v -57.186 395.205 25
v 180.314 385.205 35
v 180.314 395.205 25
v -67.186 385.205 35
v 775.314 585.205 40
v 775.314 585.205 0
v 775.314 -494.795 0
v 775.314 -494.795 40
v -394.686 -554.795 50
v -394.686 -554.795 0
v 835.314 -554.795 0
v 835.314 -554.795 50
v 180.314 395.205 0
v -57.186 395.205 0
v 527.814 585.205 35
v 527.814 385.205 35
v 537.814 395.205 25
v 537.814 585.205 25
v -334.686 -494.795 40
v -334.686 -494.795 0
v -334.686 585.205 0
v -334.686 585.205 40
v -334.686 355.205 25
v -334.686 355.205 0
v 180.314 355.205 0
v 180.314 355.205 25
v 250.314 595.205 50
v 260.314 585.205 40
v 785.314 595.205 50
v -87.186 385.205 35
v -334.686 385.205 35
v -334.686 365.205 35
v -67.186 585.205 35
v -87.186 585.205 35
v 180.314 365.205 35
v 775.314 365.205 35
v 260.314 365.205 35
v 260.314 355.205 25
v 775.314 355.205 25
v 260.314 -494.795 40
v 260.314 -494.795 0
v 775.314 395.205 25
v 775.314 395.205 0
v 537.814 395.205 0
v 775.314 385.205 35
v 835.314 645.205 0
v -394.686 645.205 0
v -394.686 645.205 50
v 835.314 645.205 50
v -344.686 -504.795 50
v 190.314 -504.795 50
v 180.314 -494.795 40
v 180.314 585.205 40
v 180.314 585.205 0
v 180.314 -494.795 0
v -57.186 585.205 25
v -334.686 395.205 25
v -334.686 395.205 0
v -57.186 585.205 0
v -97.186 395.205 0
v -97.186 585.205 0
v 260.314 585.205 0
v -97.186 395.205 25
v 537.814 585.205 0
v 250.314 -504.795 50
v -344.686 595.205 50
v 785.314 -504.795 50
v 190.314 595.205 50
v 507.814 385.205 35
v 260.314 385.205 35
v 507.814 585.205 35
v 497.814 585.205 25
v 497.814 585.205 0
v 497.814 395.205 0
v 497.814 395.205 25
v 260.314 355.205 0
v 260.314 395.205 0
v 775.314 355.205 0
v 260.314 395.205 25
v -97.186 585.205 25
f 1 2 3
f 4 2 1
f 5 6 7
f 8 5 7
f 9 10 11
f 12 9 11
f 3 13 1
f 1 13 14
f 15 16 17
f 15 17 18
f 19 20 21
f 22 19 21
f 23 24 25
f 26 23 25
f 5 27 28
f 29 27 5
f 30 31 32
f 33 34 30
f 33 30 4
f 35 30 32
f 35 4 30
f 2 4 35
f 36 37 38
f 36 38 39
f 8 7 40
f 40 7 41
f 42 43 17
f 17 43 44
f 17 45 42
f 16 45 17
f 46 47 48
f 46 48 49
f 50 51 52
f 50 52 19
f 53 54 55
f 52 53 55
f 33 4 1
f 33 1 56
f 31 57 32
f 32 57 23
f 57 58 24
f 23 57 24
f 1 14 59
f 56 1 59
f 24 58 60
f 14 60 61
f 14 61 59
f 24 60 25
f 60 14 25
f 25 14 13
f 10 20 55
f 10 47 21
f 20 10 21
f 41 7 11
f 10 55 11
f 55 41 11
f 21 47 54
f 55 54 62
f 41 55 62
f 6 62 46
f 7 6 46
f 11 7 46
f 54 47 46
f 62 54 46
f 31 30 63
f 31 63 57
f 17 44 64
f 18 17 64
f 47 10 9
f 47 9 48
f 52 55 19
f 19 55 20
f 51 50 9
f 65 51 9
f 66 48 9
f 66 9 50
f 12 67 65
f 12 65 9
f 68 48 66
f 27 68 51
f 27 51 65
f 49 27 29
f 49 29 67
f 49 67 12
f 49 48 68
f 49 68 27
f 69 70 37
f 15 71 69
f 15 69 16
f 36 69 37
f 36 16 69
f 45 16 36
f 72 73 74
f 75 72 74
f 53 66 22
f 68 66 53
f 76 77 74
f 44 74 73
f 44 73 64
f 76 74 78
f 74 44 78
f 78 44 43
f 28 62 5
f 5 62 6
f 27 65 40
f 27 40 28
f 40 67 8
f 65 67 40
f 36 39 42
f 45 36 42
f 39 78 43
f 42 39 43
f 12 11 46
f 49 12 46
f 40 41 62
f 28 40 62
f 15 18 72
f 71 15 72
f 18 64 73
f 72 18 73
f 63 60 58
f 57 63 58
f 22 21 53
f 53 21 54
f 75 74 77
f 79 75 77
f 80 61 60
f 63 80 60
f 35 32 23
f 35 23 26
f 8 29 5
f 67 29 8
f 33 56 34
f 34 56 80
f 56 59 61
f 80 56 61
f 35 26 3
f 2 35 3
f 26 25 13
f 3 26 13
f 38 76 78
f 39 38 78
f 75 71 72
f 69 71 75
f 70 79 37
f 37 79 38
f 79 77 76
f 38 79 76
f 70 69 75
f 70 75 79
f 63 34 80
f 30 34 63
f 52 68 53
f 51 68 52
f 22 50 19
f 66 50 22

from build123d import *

# Parameters (mm, degrees)
F0_W      = 1230
F0_H      = 1200
F1_DEPTH  = 50
F2_DEPTH  = 35
F3_SIZE   = 10
F3_2_SIZE = 10
F3_3_SIZE = 10


with BuildPart() as f1:
    # F0 (on Top) → F1 (new body)
    with BuildSketch(Plane.XY):
        with Locations((220.3141621128, 45.2047318473)):
            Rectangle(F0_W, F0_H)
        Polygon((-334.6858378872, -494.7952681527), (-334.6858378872, 355.2047318473), (-334.6858378872, 395.2047318473), (-334.6858378872, 585.2047318473), (-97.1858378872, 585.2047318473), (-57.1858378872, 585.2047318473), (180.3141621128, 585.2047318473), (180.3141621128, 395.2047318473), (180.3141621128, 355.2047318473), (180.3141621128, -494.7952681527), align=None, mode=Mode.SUBTRACT)
        Polygon((260.3141621128, -494.7952681527), (260.3141621128, 355.2047318473), (260.3141621128, 395.2047318473), (260.3141621128, 585.2047318473), (497.8141621128, 585.2047318473), (537.8141621128, 585.2047318473), (775.3141621128, 585.2047318473), (775.3141621128, 395.2047318473), (775.3141621128, 355.2047318473), (775.3141621128, -494.7952681527), align=None, mode=Mode.SUBTRACT)
    extrude(amount=F1_DEPTH)

    # F3
    f3_edges = [f1.edges().sort_by_distance(p)[0] for p in [
        (-334.685838, 45.204732, 50),
        (-77.185838, 585.204732, 50),
        (180.314162, 45.204732, 50),
        (260.314162, 45.204732, 50),
        (517.814162, 585.204732, 50),
        (775.314162, 45.204732, 50),
        (517.814162, -494.795268, 50),
        (-77.185838, -494.795268, 50),
    ]]
    chamfer(f3_edges, length=F3_SIZE)


with BuildPart() as f2:
    # F0 (on Top) → F2 (new body)
    with BuildSketch(Plane.XY):
        Polygon((-334.6858378872, 395.2047318473), (-334.6858378872, 355.2047318473), (180.3141621128, 355.2047318473), (180.3141621128, 395.2047318473), (-57.1858378872, 395.2047318473), (-57.1858378872, 585.2047318473), (-97.1858378872, 585.2047318473), (-97.1858378872, 395.2047318473), align=None)
    extrude(amount=F2_DEPTH)

    # F3#2
    f3_2_edges = [f2.edges().sort_by_distance(p)[0] for p in [
        (-77.185838, 355.204732, 35),
        (61.564162, 395.204732, 35),
        (-57.185838, 490.204732, 35),
        (-97.185838, 490.204732, 35),
        (-215.935838, 395.204732, 35),
    ]]
    chamfer(f3_2_edges, length=F3_2_SIZE)


with BuildPart() as f2b:
    # F0 (on Top) → F2, piece 2 (new body)
    with BuildSketch(Plane.XY):
        Polygon((260.3141621128, 395.2047318473), (260.3141621128, 355.2047318473), (775.3141621128, 355.2047318473), (775.3141621128, 395.2047318473), (537.8141621128, 395.2047318473), (537.8141621128, 585.2047318473), (497.8141621128, 585.2047318473), (497.8141621128, 395.2047318473), align=None)
    extrude(amount=F2_DEPTH)

    # F3#3
    f3_3_edges = [f2b.edges().sort_by_distance(p)[0] for p in [
        (517.814162, 355.204732, 35),
        (379.064162, 395.204732, 35),
        (537.814162, 490.204732, 35),
        (656.564162, 395.204732, 35),
        (497.814162, 490.204732, 35),
    ]]
    chamfer(f3_3_edges, length=F3_3_SIZE)


solid = Compound([f1.part, f2.part, f2b.part])
